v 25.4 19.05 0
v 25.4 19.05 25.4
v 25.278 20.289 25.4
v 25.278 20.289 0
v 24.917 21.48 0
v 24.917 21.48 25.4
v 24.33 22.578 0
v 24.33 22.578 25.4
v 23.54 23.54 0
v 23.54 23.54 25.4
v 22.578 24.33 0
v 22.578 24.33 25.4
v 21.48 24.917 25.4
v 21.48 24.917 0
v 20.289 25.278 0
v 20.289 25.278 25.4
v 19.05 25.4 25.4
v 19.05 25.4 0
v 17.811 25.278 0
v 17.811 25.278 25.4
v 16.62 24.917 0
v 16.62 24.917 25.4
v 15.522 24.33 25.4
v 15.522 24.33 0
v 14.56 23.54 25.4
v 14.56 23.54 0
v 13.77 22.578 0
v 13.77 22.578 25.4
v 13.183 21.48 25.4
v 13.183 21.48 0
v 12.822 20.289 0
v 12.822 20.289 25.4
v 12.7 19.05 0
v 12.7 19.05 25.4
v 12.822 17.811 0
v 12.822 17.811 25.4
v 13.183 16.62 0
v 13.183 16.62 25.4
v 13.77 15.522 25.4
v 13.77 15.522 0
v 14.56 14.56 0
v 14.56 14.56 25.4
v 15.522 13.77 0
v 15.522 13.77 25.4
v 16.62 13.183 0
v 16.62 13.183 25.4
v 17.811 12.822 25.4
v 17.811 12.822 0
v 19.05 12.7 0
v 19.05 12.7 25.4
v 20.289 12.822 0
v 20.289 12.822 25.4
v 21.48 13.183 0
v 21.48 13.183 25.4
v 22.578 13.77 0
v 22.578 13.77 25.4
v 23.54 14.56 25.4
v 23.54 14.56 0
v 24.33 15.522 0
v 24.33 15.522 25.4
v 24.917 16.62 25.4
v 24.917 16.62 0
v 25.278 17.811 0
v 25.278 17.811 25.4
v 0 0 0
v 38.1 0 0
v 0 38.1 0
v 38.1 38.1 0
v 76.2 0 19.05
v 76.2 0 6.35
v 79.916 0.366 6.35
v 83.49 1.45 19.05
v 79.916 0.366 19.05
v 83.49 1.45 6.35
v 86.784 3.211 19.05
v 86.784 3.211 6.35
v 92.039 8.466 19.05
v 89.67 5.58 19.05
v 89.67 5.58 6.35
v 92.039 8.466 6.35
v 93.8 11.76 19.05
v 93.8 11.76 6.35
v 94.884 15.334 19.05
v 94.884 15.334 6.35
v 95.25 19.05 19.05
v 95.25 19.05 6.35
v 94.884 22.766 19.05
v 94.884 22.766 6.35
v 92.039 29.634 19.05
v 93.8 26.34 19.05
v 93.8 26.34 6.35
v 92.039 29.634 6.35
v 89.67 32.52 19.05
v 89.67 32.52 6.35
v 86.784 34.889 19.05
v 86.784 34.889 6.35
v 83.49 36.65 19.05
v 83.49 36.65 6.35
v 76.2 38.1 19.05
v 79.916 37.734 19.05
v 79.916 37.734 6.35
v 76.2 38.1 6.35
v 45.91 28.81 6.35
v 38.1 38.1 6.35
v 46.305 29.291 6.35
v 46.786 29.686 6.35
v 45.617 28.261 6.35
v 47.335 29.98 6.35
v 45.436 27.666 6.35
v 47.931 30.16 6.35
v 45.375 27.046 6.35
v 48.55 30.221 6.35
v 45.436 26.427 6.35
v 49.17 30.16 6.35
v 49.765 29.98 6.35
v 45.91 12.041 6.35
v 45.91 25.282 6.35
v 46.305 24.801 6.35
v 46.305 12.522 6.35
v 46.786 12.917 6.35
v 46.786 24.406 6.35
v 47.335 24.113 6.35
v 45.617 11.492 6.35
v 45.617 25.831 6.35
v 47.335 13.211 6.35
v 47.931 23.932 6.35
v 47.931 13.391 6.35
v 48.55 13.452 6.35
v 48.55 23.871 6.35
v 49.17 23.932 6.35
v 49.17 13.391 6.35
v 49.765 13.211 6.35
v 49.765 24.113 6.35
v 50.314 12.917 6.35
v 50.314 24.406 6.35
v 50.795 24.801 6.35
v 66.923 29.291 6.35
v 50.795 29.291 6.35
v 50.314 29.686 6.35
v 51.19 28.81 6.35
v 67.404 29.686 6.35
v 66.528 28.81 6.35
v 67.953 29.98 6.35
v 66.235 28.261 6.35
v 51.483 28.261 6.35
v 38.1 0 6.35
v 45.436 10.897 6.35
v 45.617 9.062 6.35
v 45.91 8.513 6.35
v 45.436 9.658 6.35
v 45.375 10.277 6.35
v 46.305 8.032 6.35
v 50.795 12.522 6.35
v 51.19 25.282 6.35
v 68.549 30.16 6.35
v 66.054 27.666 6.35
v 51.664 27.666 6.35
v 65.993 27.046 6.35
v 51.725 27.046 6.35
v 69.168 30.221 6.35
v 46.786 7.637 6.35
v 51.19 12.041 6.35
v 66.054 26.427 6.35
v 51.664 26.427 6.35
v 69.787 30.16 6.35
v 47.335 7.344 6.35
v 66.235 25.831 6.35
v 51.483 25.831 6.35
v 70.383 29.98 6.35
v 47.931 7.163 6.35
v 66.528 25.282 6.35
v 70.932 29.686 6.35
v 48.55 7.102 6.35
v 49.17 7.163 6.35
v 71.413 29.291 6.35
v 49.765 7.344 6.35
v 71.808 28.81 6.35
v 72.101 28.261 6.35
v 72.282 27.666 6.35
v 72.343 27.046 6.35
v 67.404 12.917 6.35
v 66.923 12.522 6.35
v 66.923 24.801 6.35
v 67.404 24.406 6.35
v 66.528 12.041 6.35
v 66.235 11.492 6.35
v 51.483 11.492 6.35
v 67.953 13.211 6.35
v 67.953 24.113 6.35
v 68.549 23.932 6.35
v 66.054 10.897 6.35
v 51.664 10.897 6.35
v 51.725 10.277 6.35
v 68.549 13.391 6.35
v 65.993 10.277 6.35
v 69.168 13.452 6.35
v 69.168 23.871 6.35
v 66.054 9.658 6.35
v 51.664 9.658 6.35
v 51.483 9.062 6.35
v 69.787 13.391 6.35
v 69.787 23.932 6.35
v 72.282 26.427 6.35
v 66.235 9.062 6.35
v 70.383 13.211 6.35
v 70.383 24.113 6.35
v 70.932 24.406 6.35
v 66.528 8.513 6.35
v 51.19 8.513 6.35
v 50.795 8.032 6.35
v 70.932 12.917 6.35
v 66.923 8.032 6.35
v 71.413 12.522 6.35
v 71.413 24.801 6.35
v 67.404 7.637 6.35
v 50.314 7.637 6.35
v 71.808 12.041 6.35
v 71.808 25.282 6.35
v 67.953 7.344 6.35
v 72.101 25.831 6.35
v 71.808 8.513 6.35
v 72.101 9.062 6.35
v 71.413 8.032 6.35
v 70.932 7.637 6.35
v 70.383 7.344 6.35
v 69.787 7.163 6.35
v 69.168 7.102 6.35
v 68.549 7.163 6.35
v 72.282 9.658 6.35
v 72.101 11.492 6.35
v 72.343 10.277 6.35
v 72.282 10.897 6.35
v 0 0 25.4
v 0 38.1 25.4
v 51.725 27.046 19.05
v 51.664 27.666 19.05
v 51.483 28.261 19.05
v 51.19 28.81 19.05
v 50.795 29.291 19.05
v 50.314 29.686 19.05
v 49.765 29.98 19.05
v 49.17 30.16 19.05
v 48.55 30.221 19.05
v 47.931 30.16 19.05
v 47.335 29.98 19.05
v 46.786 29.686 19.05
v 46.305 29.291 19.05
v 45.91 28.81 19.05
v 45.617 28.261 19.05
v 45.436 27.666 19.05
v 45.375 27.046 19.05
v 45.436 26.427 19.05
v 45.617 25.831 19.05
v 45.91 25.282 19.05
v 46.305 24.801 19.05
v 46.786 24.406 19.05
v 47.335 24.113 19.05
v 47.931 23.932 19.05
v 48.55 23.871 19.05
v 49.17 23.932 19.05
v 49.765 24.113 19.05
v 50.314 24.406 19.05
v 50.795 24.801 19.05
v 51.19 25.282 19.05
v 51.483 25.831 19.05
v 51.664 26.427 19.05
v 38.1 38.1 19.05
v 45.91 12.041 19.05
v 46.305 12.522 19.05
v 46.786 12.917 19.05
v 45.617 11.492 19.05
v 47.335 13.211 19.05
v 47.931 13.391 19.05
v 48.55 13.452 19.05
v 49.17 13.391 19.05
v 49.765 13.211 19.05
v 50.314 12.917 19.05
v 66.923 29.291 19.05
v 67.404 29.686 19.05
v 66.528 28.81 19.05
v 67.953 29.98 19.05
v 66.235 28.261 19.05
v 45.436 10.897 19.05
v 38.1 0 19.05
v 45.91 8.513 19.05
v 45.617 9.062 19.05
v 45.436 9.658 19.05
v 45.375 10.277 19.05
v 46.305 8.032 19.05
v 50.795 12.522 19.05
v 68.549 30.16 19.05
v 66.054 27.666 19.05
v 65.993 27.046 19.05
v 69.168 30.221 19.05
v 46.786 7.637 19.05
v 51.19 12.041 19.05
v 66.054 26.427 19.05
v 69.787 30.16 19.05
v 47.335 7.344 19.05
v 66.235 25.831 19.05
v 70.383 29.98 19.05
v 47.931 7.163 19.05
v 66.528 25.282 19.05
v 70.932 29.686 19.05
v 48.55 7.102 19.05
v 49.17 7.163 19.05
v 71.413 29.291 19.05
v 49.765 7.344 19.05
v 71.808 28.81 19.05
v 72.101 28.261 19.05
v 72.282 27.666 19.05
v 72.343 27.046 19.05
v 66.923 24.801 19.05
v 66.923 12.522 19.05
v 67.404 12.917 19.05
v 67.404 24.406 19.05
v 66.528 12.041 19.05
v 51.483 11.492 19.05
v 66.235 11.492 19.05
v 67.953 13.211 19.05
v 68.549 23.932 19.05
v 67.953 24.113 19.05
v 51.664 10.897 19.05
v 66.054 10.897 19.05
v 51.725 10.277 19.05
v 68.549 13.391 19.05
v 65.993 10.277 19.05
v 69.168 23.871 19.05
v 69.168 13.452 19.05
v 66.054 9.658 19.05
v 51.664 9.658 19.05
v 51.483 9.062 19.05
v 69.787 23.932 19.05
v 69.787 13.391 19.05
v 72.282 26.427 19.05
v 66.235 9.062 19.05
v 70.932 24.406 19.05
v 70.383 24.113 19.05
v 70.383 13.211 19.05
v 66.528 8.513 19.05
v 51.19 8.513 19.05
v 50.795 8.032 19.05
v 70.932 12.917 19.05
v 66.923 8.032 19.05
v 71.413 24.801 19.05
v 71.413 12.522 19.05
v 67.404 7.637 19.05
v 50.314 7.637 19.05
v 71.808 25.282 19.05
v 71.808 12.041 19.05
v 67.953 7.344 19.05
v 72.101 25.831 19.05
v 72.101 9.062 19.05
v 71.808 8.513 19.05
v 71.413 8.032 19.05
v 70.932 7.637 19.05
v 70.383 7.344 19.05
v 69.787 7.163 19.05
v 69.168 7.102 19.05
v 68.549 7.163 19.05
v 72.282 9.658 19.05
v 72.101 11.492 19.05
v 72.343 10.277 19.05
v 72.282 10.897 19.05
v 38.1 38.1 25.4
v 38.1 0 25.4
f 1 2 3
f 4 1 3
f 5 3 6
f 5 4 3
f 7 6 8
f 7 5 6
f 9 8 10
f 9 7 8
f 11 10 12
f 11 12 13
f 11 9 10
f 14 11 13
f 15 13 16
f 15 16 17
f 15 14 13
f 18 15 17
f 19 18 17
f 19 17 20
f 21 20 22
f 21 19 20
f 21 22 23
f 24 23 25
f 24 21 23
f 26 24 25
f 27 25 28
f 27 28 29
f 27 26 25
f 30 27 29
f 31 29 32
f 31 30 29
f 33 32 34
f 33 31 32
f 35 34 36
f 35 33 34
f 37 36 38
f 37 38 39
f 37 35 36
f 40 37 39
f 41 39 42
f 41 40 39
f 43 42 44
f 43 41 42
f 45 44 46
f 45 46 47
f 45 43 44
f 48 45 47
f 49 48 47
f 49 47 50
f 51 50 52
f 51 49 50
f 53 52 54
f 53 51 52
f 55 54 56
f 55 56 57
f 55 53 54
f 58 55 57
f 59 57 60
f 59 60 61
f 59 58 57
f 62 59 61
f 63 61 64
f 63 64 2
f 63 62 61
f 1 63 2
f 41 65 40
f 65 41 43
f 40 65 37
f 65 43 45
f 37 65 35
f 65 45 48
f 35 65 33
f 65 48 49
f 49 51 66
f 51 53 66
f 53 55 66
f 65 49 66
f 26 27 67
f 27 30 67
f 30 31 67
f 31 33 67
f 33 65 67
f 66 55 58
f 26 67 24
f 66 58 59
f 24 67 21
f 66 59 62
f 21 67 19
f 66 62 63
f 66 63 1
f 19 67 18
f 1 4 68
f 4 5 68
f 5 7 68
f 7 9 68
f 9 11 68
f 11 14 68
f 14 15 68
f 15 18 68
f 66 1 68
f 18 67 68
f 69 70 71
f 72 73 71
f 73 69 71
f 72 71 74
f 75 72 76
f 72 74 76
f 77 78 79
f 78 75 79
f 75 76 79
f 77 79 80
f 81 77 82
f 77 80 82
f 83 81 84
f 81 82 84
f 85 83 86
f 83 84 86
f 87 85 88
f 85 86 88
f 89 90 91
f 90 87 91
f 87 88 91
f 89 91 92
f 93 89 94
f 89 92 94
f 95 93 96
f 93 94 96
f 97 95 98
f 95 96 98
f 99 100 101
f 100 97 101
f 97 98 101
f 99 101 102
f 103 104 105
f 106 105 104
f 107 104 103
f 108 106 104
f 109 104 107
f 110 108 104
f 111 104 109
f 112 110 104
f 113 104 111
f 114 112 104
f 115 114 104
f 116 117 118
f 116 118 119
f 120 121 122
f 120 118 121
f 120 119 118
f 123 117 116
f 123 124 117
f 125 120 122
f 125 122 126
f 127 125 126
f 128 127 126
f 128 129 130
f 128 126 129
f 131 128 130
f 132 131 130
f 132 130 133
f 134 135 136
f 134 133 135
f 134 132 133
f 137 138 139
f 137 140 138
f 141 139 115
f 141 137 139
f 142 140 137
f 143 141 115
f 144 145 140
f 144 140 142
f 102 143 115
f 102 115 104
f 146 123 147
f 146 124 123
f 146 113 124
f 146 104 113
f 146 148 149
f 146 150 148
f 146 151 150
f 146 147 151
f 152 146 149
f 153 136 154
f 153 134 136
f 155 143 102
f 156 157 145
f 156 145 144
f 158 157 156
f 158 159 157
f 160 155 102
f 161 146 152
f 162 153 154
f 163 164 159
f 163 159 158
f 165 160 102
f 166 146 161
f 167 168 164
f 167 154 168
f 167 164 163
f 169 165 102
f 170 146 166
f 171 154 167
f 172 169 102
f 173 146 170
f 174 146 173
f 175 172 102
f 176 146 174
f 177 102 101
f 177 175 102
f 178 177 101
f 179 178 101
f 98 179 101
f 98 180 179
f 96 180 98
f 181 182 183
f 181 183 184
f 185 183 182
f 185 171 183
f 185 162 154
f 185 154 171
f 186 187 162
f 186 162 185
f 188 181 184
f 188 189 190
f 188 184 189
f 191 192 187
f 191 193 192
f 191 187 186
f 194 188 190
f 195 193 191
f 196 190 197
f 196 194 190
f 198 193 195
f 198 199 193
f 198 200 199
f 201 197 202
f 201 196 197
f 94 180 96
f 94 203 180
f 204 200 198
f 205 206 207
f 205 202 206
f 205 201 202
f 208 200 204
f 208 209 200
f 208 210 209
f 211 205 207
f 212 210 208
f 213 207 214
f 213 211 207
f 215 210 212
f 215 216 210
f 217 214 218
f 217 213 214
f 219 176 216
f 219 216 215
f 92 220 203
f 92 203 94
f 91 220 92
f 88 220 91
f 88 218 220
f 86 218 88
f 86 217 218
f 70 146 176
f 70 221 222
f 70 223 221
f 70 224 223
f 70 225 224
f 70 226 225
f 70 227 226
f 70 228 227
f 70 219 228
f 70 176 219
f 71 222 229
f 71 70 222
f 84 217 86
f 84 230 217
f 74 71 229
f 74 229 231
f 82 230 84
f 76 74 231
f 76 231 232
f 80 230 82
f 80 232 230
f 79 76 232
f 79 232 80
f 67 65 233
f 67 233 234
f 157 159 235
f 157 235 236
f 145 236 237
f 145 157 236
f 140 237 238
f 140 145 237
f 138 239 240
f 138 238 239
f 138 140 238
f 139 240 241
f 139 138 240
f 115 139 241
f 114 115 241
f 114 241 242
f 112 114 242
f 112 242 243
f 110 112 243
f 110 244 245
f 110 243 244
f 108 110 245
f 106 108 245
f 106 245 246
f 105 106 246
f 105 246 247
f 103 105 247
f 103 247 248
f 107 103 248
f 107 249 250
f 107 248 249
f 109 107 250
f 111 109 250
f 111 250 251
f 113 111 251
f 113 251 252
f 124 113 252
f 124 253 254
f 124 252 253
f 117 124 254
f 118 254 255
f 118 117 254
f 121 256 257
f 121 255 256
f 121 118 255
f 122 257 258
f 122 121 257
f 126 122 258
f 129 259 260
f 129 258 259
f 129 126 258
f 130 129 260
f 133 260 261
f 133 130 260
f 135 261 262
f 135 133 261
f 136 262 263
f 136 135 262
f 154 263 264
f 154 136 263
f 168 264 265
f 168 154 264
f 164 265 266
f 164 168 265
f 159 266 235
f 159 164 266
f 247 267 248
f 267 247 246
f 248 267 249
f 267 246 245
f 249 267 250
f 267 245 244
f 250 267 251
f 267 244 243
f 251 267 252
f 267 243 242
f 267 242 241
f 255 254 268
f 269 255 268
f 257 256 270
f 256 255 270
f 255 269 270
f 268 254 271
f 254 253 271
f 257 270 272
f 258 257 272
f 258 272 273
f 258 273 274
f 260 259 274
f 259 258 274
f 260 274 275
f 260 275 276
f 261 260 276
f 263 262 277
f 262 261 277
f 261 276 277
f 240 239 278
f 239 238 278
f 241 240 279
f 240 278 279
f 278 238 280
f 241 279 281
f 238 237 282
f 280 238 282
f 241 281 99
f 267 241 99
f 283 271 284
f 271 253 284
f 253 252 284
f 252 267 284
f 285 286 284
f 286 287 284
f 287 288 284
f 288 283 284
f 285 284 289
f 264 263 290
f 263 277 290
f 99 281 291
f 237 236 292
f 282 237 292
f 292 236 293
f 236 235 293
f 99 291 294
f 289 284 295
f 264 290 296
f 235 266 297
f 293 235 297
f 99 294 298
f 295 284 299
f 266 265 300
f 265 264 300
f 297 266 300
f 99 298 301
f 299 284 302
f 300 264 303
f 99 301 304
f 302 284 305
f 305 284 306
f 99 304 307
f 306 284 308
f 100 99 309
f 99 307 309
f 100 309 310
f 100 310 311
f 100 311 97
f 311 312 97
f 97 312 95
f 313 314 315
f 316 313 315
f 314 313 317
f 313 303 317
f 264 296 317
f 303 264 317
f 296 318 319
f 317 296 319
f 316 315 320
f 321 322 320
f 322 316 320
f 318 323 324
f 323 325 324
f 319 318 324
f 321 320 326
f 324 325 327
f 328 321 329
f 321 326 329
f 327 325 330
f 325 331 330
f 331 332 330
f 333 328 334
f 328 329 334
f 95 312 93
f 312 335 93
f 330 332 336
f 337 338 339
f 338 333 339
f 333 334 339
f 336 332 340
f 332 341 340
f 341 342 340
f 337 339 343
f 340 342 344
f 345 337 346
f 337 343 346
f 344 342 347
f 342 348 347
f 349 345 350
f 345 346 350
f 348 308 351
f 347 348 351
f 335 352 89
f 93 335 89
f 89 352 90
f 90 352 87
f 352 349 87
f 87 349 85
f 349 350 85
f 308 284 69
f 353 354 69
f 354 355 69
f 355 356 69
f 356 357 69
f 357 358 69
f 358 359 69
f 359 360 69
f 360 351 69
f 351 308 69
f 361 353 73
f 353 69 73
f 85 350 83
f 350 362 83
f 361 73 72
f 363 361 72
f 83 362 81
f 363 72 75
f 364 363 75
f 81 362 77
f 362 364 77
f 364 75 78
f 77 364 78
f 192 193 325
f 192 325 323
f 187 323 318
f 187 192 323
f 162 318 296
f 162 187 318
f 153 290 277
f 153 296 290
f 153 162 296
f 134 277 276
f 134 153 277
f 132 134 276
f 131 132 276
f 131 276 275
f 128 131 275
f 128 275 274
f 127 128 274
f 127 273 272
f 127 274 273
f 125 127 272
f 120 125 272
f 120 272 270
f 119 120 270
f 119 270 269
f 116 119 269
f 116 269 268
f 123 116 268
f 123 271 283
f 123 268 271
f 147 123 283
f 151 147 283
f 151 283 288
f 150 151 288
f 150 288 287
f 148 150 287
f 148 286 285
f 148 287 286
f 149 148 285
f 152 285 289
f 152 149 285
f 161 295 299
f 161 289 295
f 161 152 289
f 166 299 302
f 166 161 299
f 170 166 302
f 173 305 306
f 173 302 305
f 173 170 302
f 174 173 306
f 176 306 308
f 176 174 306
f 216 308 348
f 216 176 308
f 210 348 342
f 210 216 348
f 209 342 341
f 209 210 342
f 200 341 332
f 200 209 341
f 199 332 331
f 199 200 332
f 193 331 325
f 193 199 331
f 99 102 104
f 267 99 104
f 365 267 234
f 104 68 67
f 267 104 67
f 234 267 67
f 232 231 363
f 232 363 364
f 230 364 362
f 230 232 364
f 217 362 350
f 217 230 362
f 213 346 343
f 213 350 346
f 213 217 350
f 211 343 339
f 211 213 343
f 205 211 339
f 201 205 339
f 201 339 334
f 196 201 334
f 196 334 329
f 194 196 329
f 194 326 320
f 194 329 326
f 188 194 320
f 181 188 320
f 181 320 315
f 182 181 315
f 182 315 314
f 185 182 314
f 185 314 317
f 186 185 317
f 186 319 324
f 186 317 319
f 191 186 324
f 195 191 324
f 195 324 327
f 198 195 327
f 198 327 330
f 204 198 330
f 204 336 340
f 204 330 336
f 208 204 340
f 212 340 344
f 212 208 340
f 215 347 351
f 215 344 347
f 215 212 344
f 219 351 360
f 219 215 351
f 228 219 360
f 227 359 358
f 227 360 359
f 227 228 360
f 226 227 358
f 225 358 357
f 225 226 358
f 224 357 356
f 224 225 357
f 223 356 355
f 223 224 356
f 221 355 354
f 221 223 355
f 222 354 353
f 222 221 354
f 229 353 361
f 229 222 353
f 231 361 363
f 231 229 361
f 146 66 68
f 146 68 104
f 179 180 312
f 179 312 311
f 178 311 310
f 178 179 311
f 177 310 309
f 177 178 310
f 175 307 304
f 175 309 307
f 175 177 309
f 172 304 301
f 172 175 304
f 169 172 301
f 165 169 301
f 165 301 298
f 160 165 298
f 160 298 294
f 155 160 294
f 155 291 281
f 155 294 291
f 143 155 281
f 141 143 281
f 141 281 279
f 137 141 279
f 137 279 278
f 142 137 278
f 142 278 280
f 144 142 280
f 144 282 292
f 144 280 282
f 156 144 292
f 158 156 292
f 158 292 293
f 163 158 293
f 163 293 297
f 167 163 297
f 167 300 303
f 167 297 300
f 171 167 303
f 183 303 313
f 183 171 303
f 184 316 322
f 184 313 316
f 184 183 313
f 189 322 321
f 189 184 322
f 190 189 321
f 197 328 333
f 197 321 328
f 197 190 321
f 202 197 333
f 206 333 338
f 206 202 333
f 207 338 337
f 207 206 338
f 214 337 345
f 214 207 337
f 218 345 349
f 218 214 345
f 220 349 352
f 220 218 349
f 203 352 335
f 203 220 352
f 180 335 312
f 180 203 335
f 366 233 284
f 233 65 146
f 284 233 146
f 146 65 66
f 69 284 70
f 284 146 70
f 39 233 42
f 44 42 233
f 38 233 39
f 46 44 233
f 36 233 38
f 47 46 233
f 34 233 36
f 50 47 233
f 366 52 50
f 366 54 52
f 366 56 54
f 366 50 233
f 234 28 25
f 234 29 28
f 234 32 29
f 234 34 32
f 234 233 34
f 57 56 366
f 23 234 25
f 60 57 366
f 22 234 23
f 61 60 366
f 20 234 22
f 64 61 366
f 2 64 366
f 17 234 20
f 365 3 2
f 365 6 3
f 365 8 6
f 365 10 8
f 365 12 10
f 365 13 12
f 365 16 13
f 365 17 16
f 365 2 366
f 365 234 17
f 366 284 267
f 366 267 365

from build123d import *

# Parameters (mm, degrees)
F0_W     = 38.1
F0_H     = 38.1
F0_R     = 6.35
F0_R_2   = 3.175
F1_DEPTH = 25.4
F2_W     = 38.1
F2_H     = 6.35
F3_DEPTH = 38.101
F4_W     = 19.165852
F4_H     = 6.453032
F4_H_2   = 6.35
F5_DEPTH = 38.101


with BuildPart() as f1:
    # F0 (on Top) → F1 (new body)
    with BuildSketch(Plane.XY):
        with Locations((19.05, 19.05)):
            Rectangle(F0_W, F0_H)
        with Locations((19.05, 19.05)):
            Circle(F0_R, mode=Mode.SUBTRACT)
        with BuildLine():
            Line((38.1, 38.1), (38.1, 0))
            Line((38.1, 0), (76.2, 0))
            ThreePointArc((76.2, 0), (95.25, 19.05), (76.2, 38.1))
            Line((76.2, 38.1), (38.1, 38.1))
        make_face()
        with Locations((48.55017, 10.277208)):
            Circle(F0_R_2, mode=Mode.SUBTRACT)
        with Locations((69.168031, 10.277208)):
            Circle(F0_R_2, mode=Mode.SUBTRACT)
        with Locations((48.55017, 27.046405)):
            Circle(F0_R_2, mode=Mode.SUBTRACT)
        with Locations((69.168031, 27.046405)):
            Circle(F0_R_2, mode=Mode.SUBTRACT)
    extrude(amount=F1_DEPTH)

    # F2 (on face) → F3 (cut, through all)
    with BuildSketch(Plane.XZ):
        with Locations((57.15, 22.225)):
            Rectangle(F2_W, F2_H)
        with Locations((57.15, 3.175)):
            Rectangle(F2_W, F2_H)
    extrude(amount=-F3_DEPTH, mode=Mode.SUBTRACT)

    # F4 (on face) → F5 (cut, through all)
    with BuildSketch(Plane.XZ):
        with Locations((85.782926, 22.276516)):
            Rectangle(F4_W, F4_H)
        with Locations((85.782926, 3.175)):
            Rectangle(F4_W, F4_H_2)
    extrude(amount=-F5_DEPTH, mode=Mode.SUBTRACT)


solid = f1.part
